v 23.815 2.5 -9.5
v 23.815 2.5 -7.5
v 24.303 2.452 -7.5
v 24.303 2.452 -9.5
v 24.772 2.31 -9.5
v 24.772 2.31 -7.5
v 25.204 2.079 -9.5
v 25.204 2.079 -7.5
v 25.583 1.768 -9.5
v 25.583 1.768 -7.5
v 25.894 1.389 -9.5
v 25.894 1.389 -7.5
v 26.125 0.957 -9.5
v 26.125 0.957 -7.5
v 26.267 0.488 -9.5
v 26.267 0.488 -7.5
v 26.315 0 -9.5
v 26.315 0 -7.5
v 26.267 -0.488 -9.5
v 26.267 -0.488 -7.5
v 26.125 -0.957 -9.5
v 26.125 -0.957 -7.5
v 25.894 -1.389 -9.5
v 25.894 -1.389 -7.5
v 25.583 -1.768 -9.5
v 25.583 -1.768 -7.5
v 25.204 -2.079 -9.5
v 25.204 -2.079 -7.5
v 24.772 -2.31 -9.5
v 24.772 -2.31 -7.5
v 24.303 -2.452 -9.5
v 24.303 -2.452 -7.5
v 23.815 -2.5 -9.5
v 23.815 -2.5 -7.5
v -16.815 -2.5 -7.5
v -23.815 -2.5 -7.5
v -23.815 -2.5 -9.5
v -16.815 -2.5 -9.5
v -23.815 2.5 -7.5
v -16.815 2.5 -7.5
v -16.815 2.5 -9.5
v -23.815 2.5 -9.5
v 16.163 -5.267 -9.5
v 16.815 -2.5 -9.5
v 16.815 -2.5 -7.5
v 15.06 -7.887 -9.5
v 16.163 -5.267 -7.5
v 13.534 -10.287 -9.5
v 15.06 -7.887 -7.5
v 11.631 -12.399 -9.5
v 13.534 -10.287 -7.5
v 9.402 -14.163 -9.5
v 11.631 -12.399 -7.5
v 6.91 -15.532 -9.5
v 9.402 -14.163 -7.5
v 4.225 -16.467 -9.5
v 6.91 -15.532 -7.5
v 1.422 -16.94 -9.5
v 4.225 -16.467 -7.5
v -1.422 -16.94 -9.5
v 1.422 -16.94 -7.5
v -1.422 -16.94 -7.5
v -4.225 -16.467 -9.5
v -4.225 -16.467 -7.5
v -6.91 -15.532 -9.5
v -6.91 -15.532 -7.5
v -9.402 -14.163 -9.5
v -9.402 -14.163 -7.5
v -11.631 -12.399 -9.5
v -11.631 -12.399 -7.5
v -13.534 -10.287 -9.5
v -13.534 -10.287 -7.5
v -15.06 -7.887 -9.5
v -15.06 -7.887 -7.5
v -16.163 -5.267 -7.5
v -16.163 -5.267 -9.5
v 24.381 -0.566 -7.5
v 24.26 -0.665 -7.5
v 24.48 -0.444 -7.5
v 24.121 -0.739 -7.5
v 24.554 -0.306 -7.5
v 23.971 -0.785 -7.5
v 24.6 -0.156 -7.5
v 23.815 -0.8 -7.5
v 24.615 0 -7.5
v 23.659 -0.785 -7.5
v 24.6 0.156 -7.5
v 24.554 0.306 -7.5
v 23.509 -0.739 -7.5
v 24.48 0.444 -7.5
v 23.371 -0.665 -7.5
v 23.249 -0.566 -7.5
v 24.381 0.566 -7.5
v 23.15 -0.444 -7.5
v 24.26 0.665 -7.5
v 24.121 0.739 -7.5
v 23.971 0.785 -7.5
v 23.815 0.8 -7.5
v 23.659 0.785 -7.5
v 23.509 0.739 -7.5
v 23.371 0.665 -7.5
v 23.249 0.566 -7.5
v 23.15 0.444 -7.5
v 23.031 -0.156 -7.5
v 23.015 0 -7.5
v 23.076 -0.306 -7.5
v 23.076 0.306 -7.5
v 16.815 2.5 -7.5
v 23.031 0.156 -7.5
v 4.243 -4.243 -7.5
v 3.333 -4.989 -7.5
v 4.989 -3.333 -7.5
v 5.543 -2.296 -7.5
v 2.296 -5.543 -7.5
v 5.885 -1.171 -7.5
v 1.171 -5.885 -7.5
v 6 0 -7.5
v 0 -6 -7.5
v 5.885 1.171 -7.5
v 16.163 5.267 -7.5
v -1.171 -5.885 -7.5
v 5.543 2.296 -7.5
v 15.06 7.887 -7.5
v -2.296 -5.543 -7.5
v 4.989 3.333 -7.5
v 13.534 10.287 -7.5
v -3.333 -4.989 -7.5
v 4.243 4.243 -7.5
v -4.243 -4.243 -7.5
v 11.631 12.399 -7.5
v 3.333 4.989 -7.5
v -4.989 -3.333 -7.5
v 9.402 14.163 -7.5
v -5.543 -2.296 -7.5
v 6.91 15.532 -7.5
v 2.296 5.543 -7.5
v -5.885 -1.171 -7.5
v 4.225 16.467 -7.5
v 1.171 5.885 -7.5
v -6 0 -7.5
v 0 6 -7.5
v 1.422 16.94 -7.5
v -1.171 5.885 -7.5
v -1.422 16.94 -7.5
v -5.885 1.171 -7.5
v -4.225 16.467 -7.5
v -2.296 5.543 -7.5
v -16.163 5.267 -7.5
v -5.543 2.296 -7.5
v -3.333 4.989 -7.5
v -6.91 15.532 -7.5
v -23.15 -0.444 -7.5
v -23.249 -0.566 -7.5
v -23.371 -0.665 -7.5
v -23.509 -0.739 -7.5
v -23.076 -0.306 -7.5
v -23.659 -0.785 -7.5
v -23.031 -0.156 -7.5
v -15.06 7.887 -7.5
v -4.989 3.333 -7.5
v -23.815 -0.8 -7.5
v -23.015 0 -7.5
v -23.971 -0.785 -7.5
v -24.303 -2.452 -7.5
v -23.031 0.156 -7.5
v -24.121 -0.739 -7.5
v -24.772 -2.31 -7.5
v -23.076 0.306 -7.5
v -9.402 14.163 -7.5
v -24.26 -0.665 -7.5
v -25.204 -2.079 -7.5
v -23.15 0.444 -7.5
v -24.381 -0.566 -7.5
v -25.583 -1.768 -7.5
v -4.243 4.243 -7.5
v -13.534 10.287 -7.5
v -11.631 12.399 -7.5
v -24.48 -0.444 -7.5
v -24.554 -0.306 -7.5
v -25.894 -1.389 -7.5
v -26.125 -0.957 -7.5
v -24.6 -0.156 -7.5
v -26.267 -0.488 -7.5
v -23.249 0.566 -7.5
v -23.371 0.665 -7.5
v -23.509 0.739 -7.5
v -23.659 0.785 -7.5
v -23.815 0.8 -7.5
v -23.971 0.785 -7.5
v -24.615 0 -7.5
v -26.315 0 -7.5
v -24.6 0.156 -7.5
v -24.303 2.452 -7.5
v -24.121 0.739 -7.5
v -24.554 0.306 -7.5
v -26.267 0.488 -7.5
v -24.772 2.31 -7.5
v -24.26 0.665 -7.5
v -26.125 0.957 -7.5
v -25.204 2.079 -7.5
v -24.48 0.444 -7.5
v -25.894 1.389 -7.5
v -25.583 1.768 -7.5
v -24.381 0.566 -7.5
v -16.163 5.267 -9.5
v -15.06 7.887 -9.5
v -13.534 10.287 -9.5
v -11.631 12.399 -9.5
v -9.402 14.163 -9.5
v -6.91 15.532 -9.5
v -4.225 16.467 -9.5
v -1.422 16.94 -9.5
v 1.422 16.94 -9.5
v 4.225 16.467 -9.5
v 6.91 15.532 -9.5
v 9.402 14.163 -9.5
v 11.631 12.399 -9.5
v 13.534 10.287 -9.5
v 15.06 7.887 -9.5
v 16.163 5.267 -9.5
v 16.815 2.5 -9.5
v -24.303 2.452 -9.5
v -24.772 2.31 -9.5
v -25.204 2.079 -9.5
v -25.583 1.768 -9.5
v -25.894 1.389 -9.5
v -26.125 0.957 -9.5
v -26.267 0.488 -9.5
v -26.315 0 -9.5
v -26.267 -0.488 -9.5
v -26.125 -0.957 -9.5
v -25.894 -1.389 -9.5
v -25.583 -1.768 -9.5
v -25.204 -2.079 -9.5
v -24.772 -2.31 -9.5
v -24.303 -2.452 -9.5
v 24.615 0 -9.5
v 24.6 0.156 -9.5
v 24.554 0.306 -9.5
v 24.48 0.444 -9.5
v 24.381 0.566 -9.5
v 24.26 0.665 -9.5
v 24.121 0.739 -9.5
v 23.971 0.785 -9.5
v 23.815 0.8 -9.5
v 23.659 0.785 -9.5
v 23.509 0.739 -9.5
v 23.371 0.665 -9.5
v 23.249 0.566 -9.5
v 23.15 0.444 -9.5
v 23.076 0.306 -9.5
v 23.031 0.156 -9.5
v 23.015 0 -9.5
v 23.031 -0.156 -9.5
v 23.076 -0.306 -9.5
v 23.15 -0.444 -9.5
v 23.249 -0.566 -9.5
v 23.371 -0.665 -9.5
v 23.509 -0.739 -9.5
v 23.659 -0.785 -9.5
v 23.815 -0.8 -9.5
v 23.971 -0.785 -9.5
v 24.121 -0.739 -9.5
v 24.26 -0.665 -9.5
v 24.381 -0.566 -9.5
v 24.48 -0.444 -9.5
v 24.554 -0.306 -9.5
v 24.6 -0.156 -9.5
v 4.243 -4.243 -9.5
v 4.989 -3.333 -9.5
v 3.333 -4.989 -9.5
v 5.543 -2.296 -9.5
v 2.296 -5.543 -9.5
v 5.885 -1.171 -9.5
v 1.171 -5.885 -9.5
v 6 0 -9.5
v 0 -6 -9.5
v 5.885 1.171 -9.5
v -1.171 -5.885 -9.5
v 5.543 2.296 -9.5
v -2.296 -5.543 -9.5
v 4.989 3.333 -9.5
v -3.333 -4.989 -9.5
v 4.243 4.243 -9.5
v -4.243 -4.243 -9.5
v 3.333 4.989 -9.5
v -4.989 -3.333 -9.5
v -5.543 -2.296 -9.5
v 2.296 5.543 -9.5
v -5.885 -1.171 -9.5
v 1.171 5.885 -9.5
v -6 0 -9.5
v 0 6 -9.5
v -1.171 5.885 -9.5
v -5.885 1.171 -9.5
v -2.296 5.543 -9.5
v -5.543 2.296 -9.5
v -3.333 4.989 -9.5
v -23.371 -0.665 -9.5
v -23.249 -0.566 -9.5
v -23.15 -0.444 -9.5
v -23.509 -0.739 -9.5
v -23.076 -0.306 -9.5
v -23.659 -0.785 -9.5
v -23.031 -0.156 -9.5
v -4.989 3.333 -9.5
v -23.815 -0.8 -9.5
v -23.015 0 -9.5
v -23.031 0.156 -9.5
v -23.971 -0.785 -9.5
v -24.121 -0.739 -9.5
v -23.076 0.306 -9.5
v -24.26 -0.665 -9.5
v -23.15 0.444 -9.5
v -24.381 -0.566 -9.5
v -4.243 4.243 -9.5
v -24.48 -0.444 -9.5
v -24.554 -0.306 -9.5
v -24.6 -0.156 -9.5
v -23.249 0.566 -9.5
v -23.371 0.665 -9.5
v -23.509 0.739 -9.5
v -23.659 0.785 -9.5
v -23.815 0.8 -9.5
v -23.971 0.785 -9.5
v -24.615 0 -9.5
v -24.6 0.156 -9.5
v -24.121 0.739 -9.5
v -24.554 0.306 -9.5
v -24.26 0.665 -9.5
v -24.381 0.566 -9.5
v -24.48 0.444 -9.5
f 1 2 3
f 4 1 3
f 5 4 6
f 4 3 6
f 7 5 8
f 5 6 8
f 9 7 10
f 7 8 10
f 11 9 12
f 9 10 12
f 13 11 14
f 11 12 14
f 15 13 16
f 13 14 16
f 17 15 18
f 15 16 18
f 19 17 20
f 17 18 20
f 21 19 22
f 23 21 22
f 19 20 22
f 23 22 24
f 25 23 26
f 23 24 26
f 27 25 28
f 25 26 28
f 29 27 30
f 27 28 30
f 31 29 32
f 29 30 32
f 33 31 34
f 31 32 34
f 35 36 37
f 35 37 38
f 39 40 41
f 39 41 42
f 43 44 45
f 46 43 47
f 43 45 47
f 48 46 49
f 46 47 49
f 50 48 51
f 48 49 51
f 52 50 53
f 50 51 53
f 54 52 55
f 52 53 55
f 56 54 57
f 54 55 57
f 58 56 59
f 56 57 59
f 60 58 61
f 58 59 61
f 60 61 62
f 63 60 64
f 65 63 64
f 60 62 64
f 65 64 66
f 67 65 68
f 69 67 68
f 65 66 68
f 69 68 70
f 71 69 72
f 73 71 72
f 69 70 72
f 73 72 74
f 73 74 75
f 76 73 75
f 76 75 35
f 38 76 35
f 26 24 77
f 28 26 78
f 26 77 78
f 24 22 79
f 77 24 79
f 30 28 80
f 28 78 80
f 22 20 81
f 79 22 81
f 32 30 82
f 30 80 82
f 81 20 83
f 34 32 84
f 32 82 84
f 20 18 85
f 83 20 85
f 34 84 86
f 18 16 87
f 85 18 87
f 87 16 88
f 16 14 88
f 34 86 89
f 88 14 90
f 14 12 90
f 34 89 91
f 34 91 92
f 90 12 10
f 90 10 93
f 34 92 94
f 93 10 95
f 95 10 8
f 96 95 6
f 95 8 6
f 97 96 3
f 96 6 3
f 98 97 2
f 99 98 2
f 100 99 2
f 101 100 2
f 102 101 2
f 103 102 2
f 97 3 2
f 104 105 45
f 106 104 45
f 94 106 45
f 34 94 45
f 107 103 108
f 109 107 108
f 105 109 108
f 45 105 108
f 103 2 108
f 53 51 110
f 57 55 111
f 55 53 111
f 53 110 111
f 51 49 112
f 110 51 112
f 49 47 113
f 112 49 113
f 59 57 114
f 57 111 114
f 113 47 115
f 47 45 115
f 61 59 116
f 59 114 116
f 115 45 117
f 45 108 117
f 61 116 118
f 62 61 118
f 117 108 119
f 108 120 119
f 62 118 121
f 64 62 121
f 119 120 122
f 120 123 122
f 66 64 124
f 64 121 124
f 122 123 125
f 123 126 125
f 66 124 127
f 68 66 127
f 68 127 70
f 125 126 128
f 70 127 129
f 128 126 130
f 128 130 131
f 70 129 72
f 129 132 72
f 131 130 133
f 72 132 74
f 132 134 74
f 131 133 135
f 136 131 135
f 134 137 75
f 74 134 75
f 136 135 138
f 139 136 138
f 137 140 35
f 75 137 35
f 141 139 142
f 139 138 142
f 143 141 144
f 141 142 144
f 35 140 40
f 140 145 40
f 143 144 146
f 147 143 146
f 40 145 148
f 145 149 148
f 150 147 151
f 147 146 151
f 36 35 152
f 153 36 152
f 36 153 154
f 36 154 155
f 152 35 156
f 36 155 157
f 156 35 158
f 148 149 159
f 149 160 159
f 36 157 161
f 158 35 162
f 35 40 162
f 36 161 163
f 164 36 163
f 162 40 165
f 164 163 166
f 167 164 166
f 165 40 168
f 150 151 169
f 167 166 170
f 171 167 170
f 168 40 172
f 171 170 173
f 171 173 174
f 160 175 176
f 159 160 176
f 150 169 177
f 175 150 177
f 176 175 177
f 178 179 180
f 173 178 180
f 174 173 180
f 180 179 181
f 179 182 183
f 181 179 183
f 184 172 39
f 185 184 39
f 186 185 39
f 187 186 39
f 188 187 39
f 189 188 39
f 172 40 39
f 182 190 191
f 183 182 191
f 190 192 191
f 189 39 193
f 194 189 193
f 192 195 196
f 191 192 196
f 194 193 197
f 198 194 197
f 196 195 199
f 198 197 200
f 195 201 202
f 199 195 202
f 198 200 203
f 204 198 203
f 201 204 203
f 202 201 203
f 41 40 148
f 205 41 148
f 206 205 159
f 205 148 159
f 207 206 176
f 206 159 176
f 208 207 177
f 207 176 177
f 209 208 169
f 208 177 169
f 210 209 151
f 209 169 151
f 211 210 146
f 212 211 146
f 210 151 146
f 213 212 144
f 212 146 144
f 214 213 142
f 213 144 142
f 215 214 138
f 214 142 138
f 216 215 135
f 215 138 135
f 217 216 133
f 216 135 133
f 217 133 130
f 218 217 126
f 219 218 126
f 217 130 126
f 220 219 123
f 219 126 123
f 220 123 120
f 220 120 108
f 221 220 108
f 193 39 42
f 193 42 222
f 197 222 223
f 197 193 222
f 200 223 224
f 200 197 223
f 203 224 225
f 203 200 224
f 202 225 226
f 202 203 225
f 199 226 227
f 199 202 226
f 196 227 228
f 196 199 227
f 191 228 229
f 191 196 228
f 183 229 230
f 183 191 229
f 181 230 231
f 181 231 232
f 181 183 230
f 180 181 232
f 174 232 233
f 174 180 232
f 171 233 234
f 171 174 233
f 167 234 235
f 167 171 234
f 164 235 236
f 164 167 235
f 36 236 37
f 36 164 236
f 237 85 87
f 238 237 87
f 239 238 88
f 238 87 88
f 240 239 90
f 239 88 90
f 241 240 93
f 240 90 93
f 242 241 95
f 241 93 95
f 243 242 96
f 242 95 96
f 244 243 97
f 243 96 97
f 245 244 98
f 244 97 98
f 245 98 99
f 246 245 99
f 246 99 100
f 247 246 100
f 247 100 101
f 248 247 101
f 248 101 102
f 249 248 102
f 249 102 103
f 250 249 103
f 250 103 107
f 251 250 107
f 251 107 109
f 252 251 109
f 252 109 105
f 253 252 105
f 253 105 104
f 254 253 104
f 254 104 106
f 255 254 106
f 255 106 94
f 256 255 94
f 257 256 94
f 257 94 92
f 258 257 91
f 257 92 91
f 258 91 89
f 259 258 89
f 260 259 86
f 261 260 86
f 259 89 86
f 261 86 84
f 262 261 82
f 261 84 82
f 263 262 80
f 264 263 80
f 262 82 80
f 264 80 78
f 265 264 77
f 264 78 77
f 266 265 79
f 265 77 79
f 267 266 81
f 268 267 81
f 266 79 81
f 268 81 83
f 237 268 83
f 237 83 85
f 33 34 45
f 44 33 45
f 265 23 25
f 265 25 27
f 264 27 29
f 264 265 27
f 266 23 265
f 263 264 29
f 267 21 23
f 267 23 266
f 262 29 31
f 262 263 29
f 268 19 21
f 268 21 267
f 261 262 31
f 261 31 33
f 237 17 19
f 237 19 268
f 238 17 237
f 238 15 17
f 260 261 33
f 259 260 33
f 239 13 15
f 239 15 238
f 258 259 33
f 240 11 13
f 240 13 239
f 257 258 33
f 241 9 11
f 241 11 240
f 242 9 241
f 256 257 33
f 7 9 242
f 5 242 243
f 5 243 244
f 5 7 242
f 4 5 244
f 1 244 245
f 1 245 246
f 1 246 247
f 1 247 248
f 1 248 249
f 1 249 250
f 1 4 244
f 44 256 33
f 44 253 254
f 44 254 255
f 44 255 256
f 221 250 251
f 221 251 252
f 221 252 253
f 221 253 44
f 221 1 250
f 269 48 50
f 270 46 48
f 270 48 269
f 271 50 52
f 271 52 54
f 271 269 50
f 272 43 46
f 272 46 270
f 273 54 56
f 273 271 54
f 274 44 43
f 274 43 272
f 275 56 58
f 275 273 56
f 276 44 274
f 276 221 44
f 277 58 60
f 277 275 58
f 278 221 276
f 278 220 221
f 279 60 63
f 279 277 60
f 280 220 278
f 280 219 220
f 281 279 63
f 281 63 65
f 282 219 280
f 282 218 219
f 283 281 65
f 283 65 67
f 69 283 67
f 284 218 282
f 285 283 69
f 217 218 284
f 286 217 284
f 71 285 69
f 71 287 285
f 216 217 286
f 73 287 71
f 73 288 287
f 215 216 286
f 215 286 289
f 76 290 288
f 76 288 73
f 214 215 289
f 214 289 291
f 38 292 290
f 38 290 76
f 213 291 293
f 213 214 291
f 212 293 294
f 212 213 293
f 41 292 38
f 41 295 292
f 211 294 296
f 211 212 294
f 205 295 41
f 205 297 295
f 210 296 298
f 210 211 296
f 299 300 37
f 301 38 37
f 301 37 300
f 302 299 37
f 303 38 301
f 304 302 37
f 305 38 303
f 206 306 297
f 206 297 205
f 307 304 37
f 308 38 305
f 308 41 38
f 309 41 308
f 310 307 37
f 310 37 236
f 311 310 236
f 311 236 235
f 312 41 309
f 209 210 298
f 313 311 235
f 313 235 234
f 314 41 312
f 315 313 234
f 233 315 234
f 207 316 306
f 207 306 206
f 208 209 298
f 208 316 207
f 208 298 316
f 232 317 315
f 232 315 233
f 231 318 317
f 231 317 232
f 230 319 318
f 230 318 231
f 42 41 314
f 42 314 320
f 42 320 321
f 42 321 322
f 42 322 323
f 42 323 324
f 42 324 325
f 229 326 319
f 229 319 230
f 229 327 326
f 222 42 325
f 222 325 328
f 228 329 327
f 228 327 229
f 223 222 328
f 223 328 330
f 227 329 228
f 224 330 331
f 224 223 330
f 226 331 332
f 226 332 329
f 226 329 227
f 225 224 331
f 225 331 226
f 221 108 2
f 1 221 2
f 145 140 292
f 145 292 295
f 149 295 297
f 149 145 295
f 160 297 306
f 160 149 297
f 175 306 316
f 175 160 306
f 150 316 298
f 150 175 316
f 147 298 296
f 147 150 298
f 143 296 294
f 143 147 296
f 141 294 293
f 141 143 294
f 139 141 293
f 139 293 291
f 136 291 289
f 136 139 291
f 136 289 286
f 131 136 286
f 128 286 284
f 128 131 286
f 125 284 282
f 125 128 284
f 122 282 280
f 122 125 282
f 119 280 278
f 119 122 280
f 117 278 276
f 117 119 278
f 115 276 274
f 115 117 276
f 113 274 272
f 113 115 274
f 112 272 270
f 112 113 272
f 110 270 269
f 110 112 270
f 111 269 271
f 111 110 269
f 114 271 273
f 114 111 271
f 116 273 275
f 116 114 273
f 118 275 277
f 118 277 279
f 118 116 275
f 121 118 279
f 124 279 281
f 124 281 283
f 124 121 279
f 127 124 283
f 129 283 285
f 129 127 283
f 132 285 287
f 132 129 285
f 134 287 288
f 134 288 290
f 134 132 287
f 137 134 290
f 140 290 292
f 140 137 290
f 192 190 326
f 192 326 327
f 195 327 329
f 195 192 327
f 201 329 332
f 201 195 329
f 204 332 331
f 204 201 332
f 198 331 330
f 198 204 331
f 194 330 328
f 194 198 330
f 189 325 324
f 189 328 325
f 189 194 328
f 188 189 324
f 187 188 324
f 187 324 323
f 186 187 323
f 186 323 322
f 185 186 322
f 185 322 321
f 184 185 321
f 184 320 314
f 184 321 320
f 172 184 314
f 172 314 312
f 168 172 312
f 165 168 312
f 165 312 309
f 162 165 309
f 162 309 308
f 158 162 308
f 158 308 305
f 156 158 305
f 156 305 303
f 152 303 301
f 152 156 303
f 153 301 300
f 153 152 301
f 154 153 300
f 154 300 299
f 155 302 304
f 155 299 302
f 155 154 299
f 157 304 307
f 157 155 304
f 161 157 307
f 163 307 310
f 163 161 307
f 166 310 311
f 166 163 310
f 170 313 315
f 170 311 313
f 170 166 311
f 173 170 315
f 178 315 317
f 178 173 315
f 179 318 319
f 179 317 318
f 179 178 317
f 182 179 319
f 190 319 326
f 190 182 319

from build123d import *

# Parameters (mm, degrees)
SKETCH_1_R               = 19
EXTRUDE_1_DEPTH          = 20
EXTRUDE_2_DEPTH          = 3
SKETCH_6_R               = 17
CUT_EXTRUDE_1_DEPTH      = 18
SKETCH_7_R               = 17
SKETCH_7_R_2             = 15
EXTRUDE_3_DEPTH          = 9.5
CUT_EXTRUDE_2_REACH      = 44.629
SKETCH_8_R               = 13
EXTRUDE_START            = -2
EXTRUDE_4_DEPTH          = 2
HOLE_WIZARD_M3_1_D       = 2.5
HOLE_WIZARD_M3_1_DEPTH   = 3
HOLE_WIZARD_M2_1_D       = 1.6
CUT_EXTRUDE_3_DEPTH      = 44.800684926
CUT_EXTRUDE_3_DEPTH_BACK = 44.800684926
SKETCH_17_W              = 74
SKETCH_17_H              = 33
SKETCH_18_R              = 15
SKETCH_18_R_2            = 6
EXTRUDE_5_DEPTH          = 2


with BuildPart() as part:
    # 草图1 → 凸台-拉伸1 (new body)
    with BuildSketch(Plane.XY):
        Circle(SKETCH_1_R)
    extrude(amount=EXTRUDE_1_DEPTH)

    # 草图3 → 凸台-拉伸2 (add)
    with BuildSketch(Plane.XY.offset(20)):
        with BuildLine():
            Line((-22.5, 10), (22.5, 10))
            ThreePointArc((22.5, 10), (32.5, 0), (22.5, -10))
            Line((22.5, -10), (-22.5, -10))
            ThreePointArc((-22.5, -10), (-32.5, 0), (-22.5, 10))
        make_face()
    extrude(amount=-EXTRUDE_2_DEPTH)

    # 草图6 → 切除-拉伸1 (cut)
    with BuildSketch(Plane.XY.offset(20)):
        Circle(SKETCH_6_R)
    extrude(amount=-CUT_EXTRUDE_1_DEPTH, mode=Mode.SUBTRACT)

    # 草图7 → 凸台-拉伸3 (add)
    with BuildSketch(Plane(origin=(0, 0, 0), x_dir=(-1, 0, 0), z_dir=(0, 0, -1))):
        with Locations(Location((0, 0, 0), (0, 0, 180))):
            Circle(SKETCH_7_R)
        Circle(SKETCH_7_R_2, mode=Mode.SUBTRACT)
    extrude(amount=EXTRUDE_3_DEPTH)

    # 草图8 → 切除-拉伸2 (cut, up to next)
    with BuildSketch(Plane(origin=(0, 0, 0), x_dir=(-1, 0, 0), z_dir=(0, 0, -1)), mode=Mode.PRIVATE) as cut_extrude_2_sk1:
        Circle(SKETCH_8_R)
    cut_extrude_2_tool1 = extrude(cut_extrude_2_sk1.sketch, amount=-CUT_EXTRUDE_2_REACH, mode=Mode.PRIVATE) & part.part
    add(cut_extrude_2_tool1.solids().sort_by_distance((0, 0, 0))[0], mode=Mode.SUBTRACT)

    # 草图10 → 凸台-拉伸4 (add)
    with BuildSketch(Plane(origin=(0, 0, -9.5), x_dir=(-1, 0, 0), z_dir=(0, 0, -1)).offset(EXTRUDE_START)):
        with BuildLine():
            Line((-16.815171721, 2.5), (-23.815171721, 2.5))
            ThreePointArc((-23.815171721, 2.5), (-26.315171721, 0), (-23.815171721, -2.5))
            Line((-23.815171721, -2.5), (-16.815171721, -2.5))
            ThreePointArc((-16.815171721, -2.5), (-17, 0), (-16.815171721, 2.5))
        make_face()
        with BuildLine():
            Line((16.815171721, 2.5), (23.815171721, 2.5))
            ThreePointArc((23.815171721, 2.5), (26.315171721, 0), (23.815171721, -2.5))
            Line((23.815171721, -2.5), (16.815171721, -2.5))
            ThreePointArc((16.815171721, -2.5), (17, 0), (16.815171721, 2.5))
        make_face()
    extrude(amount=EXTRUDE_4_DEPTH)

    # M3 螺纹孔的螺纹孔钻头1
    with Locations(Plane(origin=(0, 0, 17), x_dir=(-1, 0, 0), z_dir=(0, 0, -1))):
        with Locations((-23.815171721, 0)):
            hole_wizard_m3_1 = Hole(HOLE_WIZARD_M3_1_D / 2, depth=HOLE_WIZARD_M3_1_DEPTH)

    # M2 螺纹孔的螺纹孔钻头1 (through all)
    with Locations(Plane(origin=(0, 0, -9.5), x_dir=(-1, 0, 0), z_dir=(0, 0, -1))):
        with Locations((-23.815171721, 0)):
            hole_wizard_m2_1 = Hole(HOLE_WIZARD_M2_1_D / 2)

    # 镜向1: M3 螺纹孔的螺纹孔钻头1, M2 螺纹孔的螺纹孔钻头1 across plane
    add(hole_wizard_m3_1.mirror(Plane(origin=(0, 0, 0), x_dir=(0, 0, 1), z_dir=(1, 0, 0))), mode=Mode.SUBTRACT)
    add(hole_wizard_m2_1.mirror(Plane(origin=(0, 0, 0), x_dir=(0, 0, 1), z_dir=(1, 0, 0))), mode=Mode.SUBTRACT)

    # 草图17 → 切除-拉伸3 (cut, two sides: drawn at the far end of the back side and taken through both)
    with BuildSketch(Plane.XZ.offset(2.5).offset(-CUT_EXTRUDE_3_DEPTH_BACK)):
        with Locations((0, 9)):
            Rectangle(SKETCH_17_W, SKETCH_17_H)
    extrude(amount=CUT_EXTRUDE_3_DEPTH + CUT_EXTRUDE_3_DEPTH_BACK, mode=Mode.SUBTRACT)

    # 草图18 → 凸台-拉伸5 (add)
    with BuildSketch(Plane(origin=(0, 0, -9.5), x_dir=(-1, 0, 0), z_dir=(0, 0, -1)).offset(EXTRUDE_START)):
        Circle(SKETCH_18_R)
        Circle(SKETCH_18_R_2, mode=Mode.SUBTRACT)
    extrude(amount=EXTRUDE_5_DEPTH)


solid = part.part
